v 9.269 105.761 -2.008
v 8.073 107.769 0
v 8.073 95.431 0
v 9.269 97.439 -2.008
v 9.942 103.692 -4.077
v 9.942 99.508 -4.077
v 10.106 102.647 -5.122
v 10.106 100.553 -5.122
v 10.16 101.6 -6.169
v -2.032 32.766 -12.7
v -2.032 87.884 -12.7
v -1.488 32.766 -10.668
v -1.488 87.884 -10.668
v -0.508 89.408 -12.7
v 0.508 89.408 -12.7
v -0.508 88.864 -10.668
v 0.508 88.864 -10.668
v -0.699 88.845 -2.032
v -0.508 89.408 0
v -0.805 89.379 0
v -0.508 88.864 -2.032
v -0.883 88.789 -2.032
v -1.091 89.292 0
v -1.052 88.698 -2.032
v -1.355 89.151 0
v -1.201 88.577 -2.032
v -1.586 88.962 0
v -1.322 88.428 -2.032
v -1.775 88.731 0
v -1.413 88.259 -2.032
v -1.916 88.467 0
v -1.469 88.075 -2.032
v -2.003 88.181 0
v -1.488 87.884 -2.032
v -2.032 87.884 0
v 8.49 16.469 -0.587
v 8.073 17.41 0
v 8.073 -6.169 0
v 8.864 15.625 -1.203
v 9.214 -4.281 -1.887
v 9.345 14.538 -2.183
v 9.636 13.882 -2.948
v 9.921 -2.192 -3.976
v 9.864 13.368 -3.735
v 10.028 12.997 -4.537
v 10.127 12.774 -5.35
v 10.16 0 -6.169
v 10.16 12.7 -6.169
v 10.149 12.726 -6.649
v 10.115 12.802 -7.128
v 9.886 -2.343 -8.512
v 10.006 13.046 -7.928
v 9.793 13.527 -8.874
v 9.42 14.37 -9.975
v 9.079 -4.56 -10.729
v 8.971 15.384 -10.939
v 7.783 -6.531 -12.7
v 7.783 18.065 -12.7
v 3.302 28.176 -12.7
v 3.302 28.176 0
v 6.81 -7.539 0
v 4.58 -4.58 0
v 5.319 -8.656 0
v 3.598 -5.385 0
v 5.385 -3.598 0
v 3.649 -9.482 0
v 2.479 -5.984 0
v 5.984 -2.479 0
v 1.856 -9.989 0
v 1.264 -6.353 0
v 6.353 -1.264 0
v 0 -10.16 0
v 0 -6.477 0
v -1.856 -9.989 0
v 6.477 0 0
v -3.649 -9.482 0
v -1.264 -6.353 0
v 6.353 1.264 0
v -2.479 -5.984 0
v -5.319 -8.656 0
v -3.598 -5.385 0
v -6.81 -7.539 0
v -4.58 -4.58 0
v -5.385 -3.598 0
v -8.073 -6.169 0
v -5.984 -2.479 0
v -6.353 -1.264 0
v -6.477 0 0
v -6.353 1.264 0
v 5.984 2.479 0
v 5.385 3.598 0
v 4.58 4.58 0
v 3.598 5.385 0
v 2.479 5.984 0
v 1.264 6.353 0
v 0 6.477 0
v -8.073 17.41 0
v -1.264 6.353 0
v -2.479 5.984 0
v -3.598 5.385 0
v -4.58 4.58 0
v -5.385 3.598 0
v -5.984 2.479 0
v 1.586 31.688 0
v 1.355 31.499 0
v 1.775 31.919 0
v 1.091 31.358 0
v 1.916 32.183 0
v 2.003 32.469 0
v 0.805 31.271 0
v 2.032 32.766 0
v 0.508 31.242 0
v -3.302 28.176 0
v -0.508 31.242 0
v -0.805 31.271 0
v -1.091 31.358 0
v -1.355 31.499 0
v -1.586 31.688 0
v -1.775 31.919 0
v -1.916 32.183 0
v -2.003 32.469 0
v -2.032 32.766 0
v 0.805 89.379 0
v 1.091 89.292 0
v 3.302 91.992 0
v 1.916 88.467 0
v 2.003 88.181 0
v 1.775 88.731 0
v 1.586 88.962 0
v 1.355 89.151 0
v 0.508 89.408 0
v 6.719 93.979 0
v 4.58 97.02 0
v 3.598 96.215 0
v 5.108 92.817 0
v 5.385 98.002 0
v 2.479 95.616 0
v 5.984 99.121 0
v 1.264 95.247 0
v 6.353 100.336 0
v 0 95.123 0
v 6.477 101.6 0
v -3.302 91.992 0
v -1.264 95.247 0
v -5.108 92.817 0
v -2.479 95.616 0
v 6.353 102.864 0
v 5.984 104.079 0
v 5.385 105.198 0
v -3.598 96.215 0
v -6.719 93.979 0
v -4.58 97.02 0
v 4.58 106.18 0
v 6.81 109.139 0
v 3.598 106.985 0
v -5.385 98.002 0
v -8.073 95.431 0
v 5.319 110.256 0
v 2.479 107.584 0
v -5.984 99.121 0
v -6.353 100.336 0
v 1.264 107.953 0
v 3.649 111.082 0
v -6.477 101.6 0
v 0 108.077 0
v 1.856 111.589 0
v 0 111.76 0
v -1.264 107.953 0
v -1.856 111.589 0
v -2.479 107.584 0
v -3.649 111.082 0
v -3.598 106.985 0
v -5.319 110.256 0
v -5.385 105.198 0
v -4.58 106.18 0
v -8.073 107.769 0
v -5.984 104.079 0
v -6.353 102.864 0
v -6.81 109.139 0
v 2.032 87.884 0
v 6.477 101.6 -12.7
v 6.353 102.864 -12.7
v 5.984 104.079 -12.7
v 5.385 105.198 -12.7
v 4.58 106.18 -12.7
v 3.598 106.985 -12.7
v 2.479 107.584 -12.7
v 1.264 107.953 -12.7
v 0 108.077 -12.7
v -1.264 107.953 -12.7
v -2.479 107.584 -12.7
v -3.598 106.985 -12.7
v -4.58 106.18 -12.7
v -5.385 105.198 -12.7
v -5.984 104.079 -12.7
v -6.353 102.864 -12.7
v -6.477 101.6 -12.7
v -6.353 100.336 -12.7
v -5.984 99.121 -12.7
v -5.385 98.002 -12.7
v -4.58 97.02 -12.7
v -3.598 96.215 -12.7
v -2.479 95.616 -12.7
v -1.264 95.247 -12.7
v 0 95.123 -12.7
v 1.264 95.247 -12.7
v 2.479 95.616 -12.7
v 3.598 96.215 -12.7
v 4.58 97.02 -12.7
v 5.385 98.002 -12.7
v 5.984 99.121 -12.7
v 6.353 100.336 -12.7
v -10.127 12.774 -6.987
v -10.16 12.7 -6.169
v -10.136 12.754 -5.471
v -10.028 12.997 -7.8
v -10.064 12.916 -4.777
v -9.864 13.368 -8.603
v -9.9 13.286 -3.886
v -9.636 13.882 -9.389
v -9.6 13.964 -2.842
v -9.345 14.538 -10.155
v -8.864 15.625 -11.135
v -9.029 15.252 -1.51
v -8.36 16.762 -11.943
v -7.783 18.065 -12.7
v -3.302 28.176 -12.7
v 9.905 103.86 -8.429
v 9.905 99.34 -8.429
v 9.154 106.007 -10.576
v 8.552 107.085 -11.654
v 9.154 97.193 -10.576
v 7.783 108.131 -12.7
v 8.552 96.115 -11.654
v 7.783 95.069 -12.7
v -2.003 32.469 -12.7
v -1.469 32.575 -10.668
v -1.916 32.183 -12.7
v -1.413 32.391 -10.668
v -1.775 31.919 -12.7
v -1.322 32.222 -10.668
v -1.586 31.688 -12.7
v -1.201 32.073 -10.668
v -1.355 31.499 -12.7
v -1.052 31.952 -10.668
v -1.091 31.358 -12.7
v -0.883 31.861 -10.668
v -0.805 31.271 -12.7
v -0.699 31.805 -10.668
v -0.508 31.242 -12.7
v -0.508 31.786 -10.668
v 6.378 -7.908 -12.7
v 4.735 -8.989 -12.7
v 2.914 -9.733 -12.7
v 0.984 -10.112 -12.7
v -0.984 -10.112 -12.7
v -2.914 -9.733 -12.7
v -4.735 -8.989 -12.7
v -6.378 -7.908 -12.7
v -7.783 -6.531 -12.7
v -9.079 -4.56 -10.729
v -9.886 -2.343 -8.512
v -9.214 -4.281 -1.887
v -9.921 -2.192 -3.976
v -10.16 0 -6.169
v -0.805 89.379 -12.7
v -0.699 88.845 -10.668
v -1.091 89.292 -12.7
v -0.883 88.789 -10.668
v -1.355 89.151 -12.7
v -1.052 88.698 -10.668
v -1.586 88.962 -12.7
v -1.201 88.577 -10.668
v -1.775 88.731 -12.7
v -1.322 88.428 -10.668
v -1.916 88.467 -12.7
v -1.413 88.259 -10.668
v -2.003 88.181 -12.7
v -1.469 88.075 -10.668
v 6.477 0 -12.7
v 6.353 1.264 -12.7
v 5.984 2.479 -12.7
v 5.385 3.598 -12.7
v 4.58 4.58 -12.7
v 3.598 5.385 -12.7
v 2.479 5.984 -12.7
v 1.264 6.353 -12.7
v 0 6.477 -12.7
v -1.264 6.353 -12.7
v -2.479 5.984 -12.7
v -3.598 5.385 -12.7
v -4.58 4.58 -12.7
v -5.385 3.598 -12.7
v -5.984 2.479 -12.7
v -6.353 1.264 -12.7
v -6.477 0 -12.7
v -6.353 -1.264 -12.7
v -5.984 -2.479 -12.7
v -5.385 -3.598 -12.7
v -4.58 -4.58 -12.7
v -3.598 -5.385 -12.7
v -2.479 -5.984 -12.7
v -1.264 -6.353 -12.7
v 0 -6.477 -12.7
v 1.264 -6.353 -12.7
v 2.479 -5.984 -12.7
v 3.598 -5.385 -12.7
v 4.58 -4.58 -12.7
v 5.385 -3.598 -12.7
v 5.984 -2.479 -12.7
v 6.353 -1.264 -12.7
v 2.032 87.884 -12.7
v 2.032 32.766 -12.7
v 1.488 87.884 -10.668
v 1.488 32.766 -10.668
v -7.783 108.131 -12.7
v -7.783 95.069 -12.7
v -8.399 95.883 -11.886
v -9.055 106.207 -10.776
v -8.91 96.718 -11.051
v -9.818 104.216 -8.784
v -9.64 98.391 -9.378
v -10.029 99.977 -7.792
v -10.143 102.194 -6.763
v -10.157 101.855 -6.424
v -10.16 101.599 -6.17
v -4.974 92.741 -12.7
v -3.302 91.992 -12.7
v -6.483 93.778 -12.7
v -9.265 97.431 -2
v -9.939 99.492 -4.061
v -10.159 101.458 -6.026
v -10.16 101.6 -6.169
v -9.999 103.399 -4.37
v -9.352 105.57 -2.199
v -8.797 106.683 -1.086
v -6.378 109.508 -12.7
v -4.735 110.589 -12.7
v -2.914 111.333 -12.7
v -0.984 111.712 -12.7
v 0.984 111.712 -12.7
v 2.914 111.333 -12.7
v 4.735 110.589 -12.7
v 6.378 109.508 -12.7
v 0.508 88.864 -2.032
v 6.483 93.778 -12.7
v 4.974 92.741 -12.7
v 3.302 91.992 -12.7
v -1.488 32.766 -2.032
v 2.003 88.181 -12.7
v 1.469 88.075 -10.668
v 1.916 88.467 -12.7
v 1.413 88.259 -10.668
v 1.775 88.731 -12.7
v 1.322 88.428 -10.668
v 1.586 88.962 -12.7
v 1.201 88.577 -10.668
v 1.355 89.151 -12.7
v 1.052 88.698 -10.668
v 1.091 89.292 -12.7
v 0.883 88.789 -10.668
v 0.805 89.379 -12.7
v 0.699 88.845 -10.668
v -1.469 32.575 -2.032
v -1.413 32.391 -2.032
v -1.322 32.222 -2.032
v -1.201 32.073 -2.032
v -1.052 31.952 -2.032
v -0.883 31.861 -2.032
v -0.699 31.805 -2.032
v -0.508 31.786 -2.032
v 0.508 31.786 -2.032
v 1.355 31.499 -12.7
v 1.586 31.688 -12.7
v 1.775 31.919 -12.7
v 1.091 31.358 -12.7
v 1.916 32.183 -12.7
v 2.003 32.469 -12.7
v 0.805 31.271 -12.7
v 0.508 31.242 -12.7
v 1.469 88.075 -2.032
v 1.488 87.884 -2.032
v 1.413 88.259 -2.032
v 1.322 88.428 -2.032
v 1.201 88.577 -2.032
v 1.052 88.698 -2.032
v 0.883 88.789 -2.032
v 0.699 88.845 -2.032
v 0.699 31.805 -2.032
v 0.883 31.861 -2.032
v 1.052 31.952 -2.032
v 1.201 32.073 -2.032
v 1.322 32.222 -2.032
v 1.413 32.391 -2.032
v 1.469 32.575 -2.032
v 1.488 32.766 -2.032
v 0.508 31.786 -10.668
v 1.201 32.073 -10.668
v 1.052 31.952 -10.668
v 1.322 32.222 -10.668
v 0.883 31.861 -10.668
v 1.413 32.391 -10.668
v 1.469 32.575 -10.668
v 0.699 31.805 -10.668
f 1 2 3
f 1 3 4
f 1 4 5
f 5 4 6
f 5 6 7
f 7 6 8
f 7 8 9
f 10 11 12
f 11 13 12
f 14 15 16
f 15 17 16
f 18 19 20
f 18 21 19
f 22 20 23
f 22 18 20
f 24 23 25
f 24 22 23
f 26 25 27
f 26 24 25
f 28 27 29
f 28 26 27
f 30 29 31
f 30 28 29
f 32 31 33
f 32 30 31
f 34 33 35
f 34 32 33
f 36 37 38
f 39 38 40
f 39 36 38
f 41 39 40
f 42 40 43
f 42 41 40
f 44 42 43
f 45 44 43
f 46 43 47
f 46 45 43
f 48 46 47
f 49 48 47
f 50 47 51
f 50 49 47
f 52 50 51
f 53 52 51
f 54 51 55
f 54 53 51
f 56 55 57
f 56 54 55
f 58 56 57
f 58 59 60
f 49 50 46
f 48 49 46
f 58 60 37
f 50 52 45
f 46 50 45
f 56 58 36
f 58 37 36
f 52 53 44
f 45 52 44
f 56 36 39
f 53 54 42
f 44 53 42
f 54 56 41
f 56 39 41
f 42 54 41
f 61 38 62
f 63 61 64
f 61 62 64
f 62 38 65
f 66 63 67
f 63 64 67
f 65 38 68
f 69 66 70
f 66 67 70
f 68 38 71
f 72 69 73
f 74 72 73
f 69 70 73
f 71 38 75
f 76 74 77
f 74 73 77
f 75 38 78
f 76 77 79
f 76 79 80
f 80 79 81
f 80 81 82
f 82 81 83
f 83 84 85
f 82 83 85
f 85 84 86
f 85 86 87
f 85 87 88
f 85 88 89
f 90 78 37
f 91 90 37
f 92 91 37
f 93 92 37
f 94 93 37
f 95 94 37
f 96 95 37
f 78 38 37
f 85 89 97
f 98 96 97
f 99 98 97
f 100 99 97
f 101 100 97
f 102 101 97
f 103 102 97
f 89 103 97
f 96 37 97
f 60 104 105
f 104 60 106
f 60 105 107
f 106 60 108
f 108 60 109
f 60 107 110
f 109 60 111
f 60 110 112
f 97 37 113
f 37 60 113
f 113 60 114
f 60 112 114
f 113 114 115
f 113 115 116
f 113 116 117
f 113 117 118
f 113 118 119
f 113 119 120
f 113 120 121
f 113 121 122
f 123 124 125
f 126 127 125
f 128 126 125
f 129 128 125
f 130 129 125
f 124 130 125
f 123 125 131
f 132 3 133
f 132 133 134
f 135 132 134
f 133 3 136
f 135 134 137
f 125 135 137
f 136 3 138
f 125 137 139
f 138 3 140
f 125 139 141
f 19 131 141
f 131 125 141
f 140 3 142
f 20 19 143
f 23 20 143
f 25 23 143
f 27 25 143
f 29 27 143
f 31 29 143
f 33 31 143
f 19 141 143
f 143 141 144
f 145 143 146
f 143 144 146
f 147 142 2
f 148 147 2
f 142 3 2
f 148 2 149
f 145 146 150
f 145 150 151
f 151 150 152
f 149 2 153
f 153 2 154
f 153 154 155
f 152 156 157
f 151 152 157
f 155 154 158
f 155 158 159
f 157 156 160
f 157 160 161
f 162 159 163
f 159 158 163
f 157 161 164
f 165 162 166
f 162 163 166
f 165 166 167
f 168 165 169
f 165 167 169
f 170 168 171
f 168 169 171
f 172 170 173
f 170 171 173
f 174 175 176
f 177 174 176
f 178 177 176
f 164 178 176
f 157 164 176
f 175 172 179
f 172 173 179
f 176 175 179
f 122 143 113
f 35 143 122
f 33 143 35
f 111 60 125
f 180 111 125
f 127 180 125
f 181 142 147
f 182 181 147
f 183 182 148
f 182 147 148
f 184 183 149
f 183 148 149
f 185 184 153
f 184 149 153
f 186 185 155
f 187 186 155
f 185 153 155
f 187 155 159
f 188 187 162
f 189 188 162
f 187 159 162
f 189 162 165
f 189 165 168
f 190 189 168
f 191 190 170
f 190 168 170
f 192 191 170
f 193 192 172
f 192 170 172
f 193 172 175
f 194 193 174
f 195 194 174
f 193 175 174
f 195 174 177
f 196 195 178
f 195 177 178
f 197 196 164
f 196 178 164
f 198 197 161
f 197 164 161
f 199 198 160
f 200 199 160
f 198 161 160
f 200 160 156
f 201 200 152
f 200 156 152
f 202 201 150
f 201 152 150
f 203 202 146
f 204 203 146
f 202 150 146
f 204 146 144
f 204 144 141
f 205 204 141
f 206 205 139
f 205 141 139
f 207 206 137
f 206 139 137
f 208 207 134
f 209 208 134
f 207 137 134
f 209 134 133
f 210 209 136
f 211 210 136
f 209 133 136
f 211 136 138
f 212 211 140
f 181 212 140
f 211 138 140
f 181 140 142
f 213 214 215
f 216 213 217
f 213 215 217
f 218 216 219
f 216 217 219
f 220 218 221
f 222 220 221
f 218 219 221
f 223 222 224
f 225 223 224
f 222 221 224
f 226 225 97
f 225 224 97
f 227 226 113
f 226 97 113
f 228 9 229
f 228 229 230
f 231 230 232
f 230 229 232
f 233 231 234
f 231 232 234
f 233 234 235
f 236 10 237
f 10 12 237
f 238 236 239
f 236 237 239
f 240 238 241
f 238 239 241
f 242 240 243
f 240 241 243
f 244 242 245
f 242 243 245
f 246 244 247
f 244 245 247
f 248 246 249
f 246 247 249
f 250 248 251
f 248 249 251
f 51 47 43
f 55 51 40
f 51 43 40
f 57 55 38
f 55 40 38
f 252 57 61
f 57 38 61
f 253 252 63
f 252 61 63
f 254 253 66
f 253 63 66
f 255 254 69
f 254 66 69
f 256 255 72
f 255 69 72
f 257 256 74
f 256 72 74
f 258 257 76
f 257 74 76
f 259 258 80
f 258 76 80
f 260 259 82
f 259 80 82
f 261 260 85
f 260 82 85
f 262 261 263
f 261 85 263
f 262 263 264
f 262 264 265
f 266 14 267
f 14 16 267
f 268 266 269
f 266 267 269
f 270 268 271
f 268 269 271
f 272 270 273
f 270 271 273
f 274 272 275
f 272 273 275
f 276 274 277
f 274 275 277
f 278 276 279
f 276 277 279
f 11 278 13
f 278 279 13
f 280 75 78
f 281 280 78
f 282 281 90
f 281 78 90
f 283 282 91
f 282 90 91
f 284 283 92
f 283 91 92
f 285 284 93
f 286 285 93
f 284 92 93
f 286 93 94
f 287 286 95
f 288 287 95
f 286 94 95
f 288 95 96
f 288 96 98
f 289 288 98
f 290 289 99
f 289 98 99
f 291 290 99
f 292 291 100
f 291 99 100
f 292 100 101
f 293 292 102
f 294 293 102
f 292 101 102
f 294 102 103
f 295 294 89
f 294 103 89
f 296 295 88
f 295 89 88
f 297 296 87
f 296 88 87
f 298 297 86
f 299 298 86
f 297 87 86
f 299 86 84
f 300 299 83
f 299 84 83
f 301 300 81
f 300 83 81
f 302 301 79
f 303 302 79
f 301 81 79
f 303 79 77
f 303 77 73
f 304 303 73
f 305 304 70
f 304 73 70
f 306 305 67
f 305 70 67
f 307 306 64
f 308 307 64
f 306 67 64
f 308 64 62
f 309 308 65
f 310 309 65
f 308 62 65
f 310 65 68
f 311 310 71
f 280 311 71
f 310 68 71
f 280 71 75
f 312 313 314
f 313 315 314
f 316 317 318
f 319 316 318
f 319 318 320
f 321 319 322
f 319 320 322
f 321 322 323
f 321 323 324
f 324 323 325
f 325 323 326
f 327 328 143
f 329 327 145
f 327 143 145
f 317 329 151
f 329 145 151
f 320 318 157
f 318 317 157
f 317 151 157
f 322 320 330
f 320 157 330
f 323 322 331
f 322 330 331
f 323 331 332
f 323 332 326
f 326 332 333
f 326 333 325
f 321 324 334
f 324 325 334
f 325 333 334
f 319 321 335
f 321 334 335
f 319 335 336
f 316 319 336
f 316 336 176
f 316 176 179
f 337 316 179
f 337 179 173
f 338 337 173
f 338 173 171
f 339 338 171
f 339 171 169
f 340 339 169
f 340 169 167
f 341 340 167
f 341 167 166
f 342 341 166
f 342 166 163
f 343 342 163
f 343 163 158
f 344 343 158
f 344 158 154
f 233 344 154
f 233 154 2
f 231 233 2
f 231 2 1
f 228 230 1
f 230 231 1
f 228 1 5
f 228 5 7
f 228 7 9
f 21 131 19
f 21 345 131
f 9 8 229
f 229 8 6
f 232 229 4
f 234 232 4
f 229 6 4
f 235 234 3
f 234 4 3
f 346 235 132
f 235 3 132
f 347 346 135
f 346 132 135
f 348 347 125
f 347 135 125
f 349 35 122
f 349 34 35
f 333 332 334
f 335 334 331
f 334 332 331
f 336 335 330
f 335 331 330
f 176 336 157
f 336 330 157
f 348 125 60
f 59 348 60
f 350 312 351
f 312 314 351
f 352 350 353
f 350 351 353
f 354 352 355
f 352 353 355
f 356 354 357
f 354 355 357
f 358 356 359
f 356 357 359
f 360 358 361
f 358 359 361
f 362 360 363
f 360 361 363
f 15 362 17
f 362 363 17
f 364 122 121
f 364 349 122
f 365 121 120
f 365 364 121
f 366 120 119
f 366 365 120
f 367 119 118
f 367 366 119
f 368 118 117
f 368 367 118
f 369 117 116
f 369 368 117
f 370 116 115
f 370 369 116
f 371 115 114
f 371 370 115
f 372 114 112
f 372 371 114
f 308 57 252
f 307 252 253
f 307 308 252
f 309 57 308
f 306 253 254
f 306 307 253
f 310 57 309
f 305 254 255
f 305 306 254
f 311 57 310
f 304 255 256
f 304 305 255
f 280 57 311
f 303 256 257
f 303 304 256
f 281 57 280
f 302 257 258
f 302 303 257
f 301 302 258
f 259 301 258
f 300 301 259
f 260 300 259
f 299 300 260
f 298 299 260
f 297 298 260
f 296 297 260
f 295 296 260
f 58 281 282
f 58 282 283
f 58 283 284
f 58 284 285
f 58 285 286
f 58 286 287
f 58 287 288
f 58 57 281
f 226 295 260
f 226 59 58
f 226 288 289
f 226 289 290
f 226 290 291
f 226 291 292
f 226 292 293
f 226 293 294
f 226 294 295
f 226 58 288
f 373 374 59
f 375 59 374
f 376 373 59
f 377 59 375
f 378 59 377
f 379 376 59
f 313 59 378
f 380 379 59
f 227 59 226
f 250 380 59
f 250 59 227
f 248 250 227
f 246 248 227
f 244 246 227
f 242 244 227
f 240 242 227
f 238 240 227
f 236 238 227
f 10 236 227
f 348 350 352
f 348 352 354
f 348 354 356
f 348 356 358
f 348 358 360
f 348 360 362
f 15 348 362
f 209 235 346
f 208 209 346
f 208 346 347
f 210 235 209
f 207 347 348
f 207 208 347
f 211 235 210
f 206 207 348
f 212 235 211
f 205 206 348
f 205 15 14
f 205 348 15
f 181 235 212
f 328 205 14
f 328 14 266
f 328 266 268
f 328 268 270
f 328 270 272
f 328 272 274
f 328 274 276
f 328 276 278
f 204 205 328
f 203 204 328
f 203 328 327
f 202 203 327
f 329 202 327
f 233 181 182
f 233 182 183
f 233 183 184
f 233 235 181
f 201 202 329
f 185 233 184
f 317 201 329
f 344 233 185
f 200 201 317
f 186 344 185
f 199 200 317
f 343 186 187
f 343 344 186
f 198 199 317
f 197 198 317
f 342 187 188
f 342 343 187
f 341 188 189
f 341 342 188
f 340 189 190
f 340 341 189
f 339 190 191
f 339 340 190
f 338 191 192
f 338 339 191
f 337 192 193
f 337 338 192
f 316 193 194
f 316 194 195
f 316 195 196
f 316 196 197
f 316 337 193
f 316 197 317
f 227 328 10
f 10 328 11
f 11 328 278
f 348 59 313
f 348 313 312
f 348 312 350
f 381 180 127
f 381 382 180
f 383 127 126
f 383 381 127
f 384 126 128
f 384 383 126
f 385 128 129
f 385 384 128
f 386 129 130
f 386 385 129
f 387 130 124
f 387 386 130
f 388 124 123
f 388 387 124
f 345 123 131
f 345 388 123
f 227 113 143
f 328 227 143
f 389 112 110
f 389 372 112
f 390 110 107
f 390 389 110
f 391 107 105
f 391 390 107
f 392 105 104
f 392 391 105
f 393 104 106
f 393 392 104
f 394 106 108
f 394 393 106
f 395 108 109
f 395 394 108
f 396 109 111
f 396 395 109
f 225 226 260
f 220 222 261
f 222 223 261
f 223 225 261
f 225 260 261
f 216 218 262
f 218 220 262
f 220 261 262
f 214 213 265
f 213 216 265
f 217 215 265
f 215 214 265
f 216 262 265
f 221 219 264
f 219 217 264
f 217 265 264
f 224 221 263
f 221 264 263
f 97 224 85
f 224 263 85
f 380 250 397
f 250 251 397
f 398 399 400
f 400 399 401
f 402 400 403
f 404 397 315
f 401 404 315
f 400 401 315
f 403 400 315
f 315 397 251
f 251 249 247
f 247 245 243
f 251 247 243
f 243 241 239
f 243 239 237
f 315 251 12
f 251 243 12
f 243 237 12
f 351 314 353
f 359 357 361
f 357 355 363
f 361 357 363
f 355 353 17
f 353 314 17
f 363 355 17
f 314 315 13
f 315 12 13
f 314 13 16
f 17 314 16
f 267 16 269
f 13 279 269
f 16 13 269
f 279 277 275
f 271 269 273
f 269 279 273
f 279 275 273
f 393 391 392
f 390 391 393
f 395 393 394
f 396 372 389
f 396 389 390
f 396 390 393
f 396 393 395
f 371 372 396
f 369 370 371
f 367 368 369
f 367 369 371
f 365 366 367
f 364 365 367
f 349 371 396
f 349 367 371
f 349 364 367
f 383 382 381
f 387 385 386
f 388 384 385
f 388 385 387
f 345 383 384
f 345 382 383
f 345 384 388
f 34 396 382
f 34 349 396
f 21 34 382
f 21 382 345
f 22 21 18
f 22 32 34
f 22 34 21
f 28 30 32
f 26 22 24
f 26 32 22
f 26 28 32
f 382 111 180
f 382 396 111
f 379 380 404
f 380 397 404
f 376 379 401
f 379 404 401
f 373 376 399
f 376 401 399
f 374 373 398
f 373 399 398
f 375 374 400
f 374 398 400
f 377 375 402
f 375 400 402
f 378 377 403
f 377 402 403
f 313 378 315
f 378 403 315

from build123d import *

# Parameters (mm, degrees)
SKETCH1_R               = 6.477
BOSS_EXTRUDE2_DEPTH     = 12.7
CUT_EXTRUDE2_DEPTH      = 2.032
CUT_EXTRUDE2_TAPER      = 15
SKETCH4_OUTSIDE_W       = 47.17
SKETCH4_OUTSIDE_H       = 39.55
SKETCH4_OUTSIDE_R       = 10.16
CUT_EXTRUDE1_DEPTH      = 112.76
CUT_EXTRUDE1_DEPTH_BACK = 11.16


with BuildPart() as part:
    # Sketch1 → Boss-Extrude2 (new body)
    with BuildSketch(Plane.XY):
        with BuildLine():
            Line((-10.16, 0), (-10.16, 12.7))
            Line((-10.16, 12.7), (-3.302, 28.175956627))
            Line((-3.302, 28.175956627), (-3.302, 91.991545598))
            ThreePointArc((-3.302, 91.991545598), (0, 111.76), (3.302, 91.991545598))
            Line((3.302, 91.991545598), (3.302, 28.175956627))
            Line((3.302, 28.175956627), (10.16, 12.7))
            Line((10.16, 12.7), (10.16, 0))
            ThreePointArc((10.16, 0), (0, -10.16), (-10.16, 0))
        make_face()
        Circle(SKETCH1_R, mode=Mode.SUBTRACT)
        with Locations((0, 101.6)):
            Circle(SKETCH1_R, mode=Mode.SUBTRACT)
    extrude(amount=-BOSS_EXTRUDE2_DEPTH)

    # Sketch3 → Cut-Extrude2 (cut)
    with BuildSketch(Plane.XY):
        with BuildLine():
            ThreePointArc((-0.508, 89.408), (-1.585630735, 88.961630735), (-2.032, 87.884))
            Line((-2.032, 87.884), (-2.032, 32.766))
            ThreePointArc((-2.032, 32.766), (-1.585630735, 31.688369265), (-0.508, 31.242))
            Line((-0.508, 31.242), (0.508, 31.242))
            ThreePointArc((0.508, 31.242), (1.585630735, 31.688369265), (2.032, 32.766))
            Line((2.032, 32.766), (2.032, 87.884))
            ThreePointArc((2.032, 87.884), (1.585630735, 88.961630735), (0.508, 89.408))
            Line((0.508, 89.408), (-0.508, 89.408))
        make_face()
    cut_extrude2 = extrude(amount=-CUT_EXTRUDE2_DEPTH, taper=CUT_EXTRUDE2_TAPER, mode=Mode.SUBTRACT)

    # Mirror1: Cut-Extrude2 across plane
    add(cut_extrude2.mirror(Plane.XY.offset(-6.35)), mode=Mode.SUBTRACT)

    # Sketch4 outside → Cut-Extrude1 (cut, two sides)
    with BuildSketch(Plane(origin=(0, 0, 0), x_dir=(1, 0, 0), z_dir=(0, 1, 0))) as cut_extrude1_sk:
        with Locations((0, 6.35)):
            Rectangle(SKETCH4_OUTSIDE_W, SKETCH4_OUTSIDE_H)
        with Locations((0, 6.16880724)):
            Circle(SKETCH4_OUTSIDE_R, mode=Mode.SUBTRACT)
    extrude(amount=CUT_EXTRUDE1_DEPTH, mode=Mode.SUBTRACT)
    extrude(cut_extrude1_sk.sketch, amount=-CUT_EXTRUDE1_DEPTH_BACK, mode=Mode.SUBTRACT)


solid = part.part
